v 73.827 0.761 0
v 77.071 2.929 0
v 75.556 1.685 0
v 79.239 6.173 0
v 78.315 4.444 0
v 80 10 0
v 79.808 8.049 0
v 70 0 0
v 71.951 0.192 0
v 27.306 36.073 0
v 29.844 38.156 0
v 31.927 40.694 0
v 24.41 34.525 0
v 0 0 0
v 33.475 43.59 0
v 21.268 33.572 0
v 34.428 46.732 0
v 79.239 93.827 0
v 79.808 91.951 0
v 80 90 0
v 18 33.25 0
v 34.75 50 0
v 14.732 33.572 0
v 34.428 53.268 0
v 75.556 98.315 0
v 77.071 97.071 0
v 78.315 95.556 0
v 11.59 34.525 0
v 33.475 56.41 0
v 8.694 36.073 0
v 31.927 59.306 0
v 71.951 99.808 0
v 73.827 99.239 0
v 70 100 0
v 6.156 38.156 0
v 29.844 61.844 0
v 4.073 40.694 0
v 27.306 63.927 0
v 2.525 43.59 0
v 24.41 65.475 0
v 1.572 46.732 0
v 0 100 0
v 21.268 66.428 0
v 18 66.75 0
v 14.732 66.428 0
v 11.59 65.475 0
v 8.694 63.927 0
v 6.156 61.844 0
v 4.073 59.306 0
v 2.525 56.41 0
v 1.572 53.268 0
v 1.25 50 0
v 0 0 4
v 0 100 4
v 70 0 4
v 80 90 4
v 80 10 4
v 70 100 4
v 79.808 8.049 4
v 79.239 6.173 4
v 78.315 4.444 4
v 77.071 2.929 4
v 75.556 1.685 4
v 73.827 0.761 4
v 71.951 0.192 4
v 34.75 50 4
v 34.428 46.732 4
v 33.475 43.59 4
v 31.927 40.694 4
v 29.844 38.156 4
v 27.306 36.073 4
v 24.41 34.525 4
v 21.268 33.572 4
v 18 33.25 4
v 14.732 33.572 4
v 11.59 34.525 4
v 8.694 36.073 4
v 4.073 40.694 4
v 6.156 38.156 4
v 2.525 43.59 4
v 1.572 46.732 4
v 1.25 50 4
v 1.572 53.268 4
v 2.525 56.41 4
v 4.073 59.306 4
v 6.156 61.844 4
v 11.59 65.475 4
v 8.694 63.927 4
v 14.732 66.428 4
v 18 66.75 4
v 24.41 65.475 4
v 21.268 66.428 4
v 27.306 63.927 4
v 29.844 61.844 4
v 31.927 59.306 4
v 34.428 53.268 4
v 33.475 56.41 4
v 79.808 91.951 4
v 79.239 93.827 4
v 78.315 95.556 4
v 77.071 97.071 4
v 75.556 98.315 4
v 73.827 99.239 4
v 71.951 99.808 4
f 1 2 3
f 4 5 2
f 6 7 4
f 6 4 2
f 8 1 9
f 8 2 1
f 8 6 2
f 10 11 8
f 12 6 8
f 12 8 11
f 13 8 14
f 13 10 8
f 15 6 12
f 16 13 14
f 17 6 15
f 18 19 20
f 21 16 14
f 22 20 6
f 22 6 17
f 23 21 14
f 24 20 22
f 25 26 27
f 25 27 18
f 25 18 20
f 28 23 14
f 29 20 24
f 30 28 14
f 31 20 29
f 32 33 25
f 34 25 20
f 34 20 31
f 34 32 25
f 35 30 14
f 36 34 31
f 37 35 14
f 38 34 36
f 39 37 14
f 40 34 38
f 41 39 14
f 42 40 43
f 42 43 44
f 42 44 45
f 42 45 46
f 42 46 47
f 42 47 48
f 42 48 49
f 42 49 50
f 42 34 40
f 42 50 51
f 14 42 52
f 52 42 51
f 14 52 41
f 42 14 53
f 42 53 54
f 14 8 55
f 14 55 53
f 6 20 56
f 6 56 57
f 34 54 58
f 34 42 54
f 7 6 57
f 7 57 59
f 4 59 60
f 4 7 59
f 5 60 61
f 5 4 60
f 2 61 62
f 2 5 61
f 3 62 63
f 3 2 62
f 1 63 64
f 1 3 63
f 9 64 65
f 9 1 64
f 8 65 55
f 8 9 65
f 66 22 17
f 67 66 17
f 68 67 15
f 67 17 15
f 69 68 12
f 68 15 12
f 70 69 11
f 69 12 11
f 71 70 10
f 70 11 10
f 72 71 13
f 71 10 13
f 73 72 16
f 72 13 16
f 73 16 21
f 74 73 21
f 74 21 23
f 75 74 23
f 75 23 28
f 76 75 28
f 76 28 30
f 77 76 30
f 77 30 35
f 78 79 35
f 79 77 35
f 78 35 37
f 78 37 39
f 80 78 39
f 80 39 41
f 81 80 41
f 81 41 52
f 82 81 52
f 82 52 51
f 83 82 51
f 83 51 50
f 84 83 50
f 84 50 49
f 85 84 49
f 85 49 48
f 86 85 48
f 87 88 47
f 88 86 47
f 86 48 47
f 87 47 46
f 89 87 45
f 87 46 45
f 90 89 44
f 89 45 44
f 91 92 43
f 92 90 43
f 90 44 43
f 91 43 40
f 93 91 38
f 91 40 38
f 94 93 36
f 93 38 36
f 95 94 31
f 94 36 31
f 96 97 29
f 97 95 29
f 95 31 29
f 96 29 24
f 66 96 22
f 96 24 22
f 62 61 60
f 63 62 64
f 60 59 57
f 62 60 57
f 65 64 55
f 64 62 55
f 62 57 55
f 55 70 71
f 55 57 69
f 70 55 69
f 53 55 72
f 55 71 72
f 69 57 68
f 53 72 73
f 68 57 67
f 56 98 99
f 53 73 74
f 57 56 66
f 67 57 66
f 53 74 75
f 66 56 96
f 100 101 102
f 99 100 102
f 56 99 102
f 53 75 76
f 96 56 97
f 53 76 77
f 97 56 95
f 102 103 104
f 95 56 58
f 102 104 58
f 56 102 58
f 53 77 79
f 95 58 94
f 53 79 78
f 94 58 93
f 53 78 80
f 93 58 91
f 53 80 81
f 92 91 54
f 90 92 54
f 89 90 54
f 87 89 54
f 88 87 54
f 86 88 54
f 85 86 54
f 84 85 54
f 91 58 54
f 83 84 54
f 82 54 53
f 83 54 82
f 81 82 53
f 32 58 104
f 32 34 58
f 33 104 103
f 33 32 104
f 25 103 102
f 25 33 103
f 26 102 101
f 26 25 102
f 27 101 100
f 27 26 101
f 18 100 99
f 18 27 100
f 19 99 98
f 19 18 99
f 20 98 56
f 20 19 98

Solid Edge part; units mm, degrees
sketch "Sketch1" plane through (0, 0, 0) normal (0, 0, 1) x (1, 0, 0)
  arc A0 (70, 100) -> (80, 90) centre (70, 90) cw
  line L0 (80, 90) -> (80, 10)
  arc A1 (80, 10) -> (70, 0) centre (70, 10) cw
  line L1 (70, 0) -> (0, 0)
  line L2 (0, 0) -> (0, 100)
  line L3 (0, 100) -> (70, 100)
  circle A2 centre (18, 50) radius 16.75
extrude "Protrusion1" add sketch "Sketch1" along normal blind 4
properties material "Acrílico, alto impacto"
